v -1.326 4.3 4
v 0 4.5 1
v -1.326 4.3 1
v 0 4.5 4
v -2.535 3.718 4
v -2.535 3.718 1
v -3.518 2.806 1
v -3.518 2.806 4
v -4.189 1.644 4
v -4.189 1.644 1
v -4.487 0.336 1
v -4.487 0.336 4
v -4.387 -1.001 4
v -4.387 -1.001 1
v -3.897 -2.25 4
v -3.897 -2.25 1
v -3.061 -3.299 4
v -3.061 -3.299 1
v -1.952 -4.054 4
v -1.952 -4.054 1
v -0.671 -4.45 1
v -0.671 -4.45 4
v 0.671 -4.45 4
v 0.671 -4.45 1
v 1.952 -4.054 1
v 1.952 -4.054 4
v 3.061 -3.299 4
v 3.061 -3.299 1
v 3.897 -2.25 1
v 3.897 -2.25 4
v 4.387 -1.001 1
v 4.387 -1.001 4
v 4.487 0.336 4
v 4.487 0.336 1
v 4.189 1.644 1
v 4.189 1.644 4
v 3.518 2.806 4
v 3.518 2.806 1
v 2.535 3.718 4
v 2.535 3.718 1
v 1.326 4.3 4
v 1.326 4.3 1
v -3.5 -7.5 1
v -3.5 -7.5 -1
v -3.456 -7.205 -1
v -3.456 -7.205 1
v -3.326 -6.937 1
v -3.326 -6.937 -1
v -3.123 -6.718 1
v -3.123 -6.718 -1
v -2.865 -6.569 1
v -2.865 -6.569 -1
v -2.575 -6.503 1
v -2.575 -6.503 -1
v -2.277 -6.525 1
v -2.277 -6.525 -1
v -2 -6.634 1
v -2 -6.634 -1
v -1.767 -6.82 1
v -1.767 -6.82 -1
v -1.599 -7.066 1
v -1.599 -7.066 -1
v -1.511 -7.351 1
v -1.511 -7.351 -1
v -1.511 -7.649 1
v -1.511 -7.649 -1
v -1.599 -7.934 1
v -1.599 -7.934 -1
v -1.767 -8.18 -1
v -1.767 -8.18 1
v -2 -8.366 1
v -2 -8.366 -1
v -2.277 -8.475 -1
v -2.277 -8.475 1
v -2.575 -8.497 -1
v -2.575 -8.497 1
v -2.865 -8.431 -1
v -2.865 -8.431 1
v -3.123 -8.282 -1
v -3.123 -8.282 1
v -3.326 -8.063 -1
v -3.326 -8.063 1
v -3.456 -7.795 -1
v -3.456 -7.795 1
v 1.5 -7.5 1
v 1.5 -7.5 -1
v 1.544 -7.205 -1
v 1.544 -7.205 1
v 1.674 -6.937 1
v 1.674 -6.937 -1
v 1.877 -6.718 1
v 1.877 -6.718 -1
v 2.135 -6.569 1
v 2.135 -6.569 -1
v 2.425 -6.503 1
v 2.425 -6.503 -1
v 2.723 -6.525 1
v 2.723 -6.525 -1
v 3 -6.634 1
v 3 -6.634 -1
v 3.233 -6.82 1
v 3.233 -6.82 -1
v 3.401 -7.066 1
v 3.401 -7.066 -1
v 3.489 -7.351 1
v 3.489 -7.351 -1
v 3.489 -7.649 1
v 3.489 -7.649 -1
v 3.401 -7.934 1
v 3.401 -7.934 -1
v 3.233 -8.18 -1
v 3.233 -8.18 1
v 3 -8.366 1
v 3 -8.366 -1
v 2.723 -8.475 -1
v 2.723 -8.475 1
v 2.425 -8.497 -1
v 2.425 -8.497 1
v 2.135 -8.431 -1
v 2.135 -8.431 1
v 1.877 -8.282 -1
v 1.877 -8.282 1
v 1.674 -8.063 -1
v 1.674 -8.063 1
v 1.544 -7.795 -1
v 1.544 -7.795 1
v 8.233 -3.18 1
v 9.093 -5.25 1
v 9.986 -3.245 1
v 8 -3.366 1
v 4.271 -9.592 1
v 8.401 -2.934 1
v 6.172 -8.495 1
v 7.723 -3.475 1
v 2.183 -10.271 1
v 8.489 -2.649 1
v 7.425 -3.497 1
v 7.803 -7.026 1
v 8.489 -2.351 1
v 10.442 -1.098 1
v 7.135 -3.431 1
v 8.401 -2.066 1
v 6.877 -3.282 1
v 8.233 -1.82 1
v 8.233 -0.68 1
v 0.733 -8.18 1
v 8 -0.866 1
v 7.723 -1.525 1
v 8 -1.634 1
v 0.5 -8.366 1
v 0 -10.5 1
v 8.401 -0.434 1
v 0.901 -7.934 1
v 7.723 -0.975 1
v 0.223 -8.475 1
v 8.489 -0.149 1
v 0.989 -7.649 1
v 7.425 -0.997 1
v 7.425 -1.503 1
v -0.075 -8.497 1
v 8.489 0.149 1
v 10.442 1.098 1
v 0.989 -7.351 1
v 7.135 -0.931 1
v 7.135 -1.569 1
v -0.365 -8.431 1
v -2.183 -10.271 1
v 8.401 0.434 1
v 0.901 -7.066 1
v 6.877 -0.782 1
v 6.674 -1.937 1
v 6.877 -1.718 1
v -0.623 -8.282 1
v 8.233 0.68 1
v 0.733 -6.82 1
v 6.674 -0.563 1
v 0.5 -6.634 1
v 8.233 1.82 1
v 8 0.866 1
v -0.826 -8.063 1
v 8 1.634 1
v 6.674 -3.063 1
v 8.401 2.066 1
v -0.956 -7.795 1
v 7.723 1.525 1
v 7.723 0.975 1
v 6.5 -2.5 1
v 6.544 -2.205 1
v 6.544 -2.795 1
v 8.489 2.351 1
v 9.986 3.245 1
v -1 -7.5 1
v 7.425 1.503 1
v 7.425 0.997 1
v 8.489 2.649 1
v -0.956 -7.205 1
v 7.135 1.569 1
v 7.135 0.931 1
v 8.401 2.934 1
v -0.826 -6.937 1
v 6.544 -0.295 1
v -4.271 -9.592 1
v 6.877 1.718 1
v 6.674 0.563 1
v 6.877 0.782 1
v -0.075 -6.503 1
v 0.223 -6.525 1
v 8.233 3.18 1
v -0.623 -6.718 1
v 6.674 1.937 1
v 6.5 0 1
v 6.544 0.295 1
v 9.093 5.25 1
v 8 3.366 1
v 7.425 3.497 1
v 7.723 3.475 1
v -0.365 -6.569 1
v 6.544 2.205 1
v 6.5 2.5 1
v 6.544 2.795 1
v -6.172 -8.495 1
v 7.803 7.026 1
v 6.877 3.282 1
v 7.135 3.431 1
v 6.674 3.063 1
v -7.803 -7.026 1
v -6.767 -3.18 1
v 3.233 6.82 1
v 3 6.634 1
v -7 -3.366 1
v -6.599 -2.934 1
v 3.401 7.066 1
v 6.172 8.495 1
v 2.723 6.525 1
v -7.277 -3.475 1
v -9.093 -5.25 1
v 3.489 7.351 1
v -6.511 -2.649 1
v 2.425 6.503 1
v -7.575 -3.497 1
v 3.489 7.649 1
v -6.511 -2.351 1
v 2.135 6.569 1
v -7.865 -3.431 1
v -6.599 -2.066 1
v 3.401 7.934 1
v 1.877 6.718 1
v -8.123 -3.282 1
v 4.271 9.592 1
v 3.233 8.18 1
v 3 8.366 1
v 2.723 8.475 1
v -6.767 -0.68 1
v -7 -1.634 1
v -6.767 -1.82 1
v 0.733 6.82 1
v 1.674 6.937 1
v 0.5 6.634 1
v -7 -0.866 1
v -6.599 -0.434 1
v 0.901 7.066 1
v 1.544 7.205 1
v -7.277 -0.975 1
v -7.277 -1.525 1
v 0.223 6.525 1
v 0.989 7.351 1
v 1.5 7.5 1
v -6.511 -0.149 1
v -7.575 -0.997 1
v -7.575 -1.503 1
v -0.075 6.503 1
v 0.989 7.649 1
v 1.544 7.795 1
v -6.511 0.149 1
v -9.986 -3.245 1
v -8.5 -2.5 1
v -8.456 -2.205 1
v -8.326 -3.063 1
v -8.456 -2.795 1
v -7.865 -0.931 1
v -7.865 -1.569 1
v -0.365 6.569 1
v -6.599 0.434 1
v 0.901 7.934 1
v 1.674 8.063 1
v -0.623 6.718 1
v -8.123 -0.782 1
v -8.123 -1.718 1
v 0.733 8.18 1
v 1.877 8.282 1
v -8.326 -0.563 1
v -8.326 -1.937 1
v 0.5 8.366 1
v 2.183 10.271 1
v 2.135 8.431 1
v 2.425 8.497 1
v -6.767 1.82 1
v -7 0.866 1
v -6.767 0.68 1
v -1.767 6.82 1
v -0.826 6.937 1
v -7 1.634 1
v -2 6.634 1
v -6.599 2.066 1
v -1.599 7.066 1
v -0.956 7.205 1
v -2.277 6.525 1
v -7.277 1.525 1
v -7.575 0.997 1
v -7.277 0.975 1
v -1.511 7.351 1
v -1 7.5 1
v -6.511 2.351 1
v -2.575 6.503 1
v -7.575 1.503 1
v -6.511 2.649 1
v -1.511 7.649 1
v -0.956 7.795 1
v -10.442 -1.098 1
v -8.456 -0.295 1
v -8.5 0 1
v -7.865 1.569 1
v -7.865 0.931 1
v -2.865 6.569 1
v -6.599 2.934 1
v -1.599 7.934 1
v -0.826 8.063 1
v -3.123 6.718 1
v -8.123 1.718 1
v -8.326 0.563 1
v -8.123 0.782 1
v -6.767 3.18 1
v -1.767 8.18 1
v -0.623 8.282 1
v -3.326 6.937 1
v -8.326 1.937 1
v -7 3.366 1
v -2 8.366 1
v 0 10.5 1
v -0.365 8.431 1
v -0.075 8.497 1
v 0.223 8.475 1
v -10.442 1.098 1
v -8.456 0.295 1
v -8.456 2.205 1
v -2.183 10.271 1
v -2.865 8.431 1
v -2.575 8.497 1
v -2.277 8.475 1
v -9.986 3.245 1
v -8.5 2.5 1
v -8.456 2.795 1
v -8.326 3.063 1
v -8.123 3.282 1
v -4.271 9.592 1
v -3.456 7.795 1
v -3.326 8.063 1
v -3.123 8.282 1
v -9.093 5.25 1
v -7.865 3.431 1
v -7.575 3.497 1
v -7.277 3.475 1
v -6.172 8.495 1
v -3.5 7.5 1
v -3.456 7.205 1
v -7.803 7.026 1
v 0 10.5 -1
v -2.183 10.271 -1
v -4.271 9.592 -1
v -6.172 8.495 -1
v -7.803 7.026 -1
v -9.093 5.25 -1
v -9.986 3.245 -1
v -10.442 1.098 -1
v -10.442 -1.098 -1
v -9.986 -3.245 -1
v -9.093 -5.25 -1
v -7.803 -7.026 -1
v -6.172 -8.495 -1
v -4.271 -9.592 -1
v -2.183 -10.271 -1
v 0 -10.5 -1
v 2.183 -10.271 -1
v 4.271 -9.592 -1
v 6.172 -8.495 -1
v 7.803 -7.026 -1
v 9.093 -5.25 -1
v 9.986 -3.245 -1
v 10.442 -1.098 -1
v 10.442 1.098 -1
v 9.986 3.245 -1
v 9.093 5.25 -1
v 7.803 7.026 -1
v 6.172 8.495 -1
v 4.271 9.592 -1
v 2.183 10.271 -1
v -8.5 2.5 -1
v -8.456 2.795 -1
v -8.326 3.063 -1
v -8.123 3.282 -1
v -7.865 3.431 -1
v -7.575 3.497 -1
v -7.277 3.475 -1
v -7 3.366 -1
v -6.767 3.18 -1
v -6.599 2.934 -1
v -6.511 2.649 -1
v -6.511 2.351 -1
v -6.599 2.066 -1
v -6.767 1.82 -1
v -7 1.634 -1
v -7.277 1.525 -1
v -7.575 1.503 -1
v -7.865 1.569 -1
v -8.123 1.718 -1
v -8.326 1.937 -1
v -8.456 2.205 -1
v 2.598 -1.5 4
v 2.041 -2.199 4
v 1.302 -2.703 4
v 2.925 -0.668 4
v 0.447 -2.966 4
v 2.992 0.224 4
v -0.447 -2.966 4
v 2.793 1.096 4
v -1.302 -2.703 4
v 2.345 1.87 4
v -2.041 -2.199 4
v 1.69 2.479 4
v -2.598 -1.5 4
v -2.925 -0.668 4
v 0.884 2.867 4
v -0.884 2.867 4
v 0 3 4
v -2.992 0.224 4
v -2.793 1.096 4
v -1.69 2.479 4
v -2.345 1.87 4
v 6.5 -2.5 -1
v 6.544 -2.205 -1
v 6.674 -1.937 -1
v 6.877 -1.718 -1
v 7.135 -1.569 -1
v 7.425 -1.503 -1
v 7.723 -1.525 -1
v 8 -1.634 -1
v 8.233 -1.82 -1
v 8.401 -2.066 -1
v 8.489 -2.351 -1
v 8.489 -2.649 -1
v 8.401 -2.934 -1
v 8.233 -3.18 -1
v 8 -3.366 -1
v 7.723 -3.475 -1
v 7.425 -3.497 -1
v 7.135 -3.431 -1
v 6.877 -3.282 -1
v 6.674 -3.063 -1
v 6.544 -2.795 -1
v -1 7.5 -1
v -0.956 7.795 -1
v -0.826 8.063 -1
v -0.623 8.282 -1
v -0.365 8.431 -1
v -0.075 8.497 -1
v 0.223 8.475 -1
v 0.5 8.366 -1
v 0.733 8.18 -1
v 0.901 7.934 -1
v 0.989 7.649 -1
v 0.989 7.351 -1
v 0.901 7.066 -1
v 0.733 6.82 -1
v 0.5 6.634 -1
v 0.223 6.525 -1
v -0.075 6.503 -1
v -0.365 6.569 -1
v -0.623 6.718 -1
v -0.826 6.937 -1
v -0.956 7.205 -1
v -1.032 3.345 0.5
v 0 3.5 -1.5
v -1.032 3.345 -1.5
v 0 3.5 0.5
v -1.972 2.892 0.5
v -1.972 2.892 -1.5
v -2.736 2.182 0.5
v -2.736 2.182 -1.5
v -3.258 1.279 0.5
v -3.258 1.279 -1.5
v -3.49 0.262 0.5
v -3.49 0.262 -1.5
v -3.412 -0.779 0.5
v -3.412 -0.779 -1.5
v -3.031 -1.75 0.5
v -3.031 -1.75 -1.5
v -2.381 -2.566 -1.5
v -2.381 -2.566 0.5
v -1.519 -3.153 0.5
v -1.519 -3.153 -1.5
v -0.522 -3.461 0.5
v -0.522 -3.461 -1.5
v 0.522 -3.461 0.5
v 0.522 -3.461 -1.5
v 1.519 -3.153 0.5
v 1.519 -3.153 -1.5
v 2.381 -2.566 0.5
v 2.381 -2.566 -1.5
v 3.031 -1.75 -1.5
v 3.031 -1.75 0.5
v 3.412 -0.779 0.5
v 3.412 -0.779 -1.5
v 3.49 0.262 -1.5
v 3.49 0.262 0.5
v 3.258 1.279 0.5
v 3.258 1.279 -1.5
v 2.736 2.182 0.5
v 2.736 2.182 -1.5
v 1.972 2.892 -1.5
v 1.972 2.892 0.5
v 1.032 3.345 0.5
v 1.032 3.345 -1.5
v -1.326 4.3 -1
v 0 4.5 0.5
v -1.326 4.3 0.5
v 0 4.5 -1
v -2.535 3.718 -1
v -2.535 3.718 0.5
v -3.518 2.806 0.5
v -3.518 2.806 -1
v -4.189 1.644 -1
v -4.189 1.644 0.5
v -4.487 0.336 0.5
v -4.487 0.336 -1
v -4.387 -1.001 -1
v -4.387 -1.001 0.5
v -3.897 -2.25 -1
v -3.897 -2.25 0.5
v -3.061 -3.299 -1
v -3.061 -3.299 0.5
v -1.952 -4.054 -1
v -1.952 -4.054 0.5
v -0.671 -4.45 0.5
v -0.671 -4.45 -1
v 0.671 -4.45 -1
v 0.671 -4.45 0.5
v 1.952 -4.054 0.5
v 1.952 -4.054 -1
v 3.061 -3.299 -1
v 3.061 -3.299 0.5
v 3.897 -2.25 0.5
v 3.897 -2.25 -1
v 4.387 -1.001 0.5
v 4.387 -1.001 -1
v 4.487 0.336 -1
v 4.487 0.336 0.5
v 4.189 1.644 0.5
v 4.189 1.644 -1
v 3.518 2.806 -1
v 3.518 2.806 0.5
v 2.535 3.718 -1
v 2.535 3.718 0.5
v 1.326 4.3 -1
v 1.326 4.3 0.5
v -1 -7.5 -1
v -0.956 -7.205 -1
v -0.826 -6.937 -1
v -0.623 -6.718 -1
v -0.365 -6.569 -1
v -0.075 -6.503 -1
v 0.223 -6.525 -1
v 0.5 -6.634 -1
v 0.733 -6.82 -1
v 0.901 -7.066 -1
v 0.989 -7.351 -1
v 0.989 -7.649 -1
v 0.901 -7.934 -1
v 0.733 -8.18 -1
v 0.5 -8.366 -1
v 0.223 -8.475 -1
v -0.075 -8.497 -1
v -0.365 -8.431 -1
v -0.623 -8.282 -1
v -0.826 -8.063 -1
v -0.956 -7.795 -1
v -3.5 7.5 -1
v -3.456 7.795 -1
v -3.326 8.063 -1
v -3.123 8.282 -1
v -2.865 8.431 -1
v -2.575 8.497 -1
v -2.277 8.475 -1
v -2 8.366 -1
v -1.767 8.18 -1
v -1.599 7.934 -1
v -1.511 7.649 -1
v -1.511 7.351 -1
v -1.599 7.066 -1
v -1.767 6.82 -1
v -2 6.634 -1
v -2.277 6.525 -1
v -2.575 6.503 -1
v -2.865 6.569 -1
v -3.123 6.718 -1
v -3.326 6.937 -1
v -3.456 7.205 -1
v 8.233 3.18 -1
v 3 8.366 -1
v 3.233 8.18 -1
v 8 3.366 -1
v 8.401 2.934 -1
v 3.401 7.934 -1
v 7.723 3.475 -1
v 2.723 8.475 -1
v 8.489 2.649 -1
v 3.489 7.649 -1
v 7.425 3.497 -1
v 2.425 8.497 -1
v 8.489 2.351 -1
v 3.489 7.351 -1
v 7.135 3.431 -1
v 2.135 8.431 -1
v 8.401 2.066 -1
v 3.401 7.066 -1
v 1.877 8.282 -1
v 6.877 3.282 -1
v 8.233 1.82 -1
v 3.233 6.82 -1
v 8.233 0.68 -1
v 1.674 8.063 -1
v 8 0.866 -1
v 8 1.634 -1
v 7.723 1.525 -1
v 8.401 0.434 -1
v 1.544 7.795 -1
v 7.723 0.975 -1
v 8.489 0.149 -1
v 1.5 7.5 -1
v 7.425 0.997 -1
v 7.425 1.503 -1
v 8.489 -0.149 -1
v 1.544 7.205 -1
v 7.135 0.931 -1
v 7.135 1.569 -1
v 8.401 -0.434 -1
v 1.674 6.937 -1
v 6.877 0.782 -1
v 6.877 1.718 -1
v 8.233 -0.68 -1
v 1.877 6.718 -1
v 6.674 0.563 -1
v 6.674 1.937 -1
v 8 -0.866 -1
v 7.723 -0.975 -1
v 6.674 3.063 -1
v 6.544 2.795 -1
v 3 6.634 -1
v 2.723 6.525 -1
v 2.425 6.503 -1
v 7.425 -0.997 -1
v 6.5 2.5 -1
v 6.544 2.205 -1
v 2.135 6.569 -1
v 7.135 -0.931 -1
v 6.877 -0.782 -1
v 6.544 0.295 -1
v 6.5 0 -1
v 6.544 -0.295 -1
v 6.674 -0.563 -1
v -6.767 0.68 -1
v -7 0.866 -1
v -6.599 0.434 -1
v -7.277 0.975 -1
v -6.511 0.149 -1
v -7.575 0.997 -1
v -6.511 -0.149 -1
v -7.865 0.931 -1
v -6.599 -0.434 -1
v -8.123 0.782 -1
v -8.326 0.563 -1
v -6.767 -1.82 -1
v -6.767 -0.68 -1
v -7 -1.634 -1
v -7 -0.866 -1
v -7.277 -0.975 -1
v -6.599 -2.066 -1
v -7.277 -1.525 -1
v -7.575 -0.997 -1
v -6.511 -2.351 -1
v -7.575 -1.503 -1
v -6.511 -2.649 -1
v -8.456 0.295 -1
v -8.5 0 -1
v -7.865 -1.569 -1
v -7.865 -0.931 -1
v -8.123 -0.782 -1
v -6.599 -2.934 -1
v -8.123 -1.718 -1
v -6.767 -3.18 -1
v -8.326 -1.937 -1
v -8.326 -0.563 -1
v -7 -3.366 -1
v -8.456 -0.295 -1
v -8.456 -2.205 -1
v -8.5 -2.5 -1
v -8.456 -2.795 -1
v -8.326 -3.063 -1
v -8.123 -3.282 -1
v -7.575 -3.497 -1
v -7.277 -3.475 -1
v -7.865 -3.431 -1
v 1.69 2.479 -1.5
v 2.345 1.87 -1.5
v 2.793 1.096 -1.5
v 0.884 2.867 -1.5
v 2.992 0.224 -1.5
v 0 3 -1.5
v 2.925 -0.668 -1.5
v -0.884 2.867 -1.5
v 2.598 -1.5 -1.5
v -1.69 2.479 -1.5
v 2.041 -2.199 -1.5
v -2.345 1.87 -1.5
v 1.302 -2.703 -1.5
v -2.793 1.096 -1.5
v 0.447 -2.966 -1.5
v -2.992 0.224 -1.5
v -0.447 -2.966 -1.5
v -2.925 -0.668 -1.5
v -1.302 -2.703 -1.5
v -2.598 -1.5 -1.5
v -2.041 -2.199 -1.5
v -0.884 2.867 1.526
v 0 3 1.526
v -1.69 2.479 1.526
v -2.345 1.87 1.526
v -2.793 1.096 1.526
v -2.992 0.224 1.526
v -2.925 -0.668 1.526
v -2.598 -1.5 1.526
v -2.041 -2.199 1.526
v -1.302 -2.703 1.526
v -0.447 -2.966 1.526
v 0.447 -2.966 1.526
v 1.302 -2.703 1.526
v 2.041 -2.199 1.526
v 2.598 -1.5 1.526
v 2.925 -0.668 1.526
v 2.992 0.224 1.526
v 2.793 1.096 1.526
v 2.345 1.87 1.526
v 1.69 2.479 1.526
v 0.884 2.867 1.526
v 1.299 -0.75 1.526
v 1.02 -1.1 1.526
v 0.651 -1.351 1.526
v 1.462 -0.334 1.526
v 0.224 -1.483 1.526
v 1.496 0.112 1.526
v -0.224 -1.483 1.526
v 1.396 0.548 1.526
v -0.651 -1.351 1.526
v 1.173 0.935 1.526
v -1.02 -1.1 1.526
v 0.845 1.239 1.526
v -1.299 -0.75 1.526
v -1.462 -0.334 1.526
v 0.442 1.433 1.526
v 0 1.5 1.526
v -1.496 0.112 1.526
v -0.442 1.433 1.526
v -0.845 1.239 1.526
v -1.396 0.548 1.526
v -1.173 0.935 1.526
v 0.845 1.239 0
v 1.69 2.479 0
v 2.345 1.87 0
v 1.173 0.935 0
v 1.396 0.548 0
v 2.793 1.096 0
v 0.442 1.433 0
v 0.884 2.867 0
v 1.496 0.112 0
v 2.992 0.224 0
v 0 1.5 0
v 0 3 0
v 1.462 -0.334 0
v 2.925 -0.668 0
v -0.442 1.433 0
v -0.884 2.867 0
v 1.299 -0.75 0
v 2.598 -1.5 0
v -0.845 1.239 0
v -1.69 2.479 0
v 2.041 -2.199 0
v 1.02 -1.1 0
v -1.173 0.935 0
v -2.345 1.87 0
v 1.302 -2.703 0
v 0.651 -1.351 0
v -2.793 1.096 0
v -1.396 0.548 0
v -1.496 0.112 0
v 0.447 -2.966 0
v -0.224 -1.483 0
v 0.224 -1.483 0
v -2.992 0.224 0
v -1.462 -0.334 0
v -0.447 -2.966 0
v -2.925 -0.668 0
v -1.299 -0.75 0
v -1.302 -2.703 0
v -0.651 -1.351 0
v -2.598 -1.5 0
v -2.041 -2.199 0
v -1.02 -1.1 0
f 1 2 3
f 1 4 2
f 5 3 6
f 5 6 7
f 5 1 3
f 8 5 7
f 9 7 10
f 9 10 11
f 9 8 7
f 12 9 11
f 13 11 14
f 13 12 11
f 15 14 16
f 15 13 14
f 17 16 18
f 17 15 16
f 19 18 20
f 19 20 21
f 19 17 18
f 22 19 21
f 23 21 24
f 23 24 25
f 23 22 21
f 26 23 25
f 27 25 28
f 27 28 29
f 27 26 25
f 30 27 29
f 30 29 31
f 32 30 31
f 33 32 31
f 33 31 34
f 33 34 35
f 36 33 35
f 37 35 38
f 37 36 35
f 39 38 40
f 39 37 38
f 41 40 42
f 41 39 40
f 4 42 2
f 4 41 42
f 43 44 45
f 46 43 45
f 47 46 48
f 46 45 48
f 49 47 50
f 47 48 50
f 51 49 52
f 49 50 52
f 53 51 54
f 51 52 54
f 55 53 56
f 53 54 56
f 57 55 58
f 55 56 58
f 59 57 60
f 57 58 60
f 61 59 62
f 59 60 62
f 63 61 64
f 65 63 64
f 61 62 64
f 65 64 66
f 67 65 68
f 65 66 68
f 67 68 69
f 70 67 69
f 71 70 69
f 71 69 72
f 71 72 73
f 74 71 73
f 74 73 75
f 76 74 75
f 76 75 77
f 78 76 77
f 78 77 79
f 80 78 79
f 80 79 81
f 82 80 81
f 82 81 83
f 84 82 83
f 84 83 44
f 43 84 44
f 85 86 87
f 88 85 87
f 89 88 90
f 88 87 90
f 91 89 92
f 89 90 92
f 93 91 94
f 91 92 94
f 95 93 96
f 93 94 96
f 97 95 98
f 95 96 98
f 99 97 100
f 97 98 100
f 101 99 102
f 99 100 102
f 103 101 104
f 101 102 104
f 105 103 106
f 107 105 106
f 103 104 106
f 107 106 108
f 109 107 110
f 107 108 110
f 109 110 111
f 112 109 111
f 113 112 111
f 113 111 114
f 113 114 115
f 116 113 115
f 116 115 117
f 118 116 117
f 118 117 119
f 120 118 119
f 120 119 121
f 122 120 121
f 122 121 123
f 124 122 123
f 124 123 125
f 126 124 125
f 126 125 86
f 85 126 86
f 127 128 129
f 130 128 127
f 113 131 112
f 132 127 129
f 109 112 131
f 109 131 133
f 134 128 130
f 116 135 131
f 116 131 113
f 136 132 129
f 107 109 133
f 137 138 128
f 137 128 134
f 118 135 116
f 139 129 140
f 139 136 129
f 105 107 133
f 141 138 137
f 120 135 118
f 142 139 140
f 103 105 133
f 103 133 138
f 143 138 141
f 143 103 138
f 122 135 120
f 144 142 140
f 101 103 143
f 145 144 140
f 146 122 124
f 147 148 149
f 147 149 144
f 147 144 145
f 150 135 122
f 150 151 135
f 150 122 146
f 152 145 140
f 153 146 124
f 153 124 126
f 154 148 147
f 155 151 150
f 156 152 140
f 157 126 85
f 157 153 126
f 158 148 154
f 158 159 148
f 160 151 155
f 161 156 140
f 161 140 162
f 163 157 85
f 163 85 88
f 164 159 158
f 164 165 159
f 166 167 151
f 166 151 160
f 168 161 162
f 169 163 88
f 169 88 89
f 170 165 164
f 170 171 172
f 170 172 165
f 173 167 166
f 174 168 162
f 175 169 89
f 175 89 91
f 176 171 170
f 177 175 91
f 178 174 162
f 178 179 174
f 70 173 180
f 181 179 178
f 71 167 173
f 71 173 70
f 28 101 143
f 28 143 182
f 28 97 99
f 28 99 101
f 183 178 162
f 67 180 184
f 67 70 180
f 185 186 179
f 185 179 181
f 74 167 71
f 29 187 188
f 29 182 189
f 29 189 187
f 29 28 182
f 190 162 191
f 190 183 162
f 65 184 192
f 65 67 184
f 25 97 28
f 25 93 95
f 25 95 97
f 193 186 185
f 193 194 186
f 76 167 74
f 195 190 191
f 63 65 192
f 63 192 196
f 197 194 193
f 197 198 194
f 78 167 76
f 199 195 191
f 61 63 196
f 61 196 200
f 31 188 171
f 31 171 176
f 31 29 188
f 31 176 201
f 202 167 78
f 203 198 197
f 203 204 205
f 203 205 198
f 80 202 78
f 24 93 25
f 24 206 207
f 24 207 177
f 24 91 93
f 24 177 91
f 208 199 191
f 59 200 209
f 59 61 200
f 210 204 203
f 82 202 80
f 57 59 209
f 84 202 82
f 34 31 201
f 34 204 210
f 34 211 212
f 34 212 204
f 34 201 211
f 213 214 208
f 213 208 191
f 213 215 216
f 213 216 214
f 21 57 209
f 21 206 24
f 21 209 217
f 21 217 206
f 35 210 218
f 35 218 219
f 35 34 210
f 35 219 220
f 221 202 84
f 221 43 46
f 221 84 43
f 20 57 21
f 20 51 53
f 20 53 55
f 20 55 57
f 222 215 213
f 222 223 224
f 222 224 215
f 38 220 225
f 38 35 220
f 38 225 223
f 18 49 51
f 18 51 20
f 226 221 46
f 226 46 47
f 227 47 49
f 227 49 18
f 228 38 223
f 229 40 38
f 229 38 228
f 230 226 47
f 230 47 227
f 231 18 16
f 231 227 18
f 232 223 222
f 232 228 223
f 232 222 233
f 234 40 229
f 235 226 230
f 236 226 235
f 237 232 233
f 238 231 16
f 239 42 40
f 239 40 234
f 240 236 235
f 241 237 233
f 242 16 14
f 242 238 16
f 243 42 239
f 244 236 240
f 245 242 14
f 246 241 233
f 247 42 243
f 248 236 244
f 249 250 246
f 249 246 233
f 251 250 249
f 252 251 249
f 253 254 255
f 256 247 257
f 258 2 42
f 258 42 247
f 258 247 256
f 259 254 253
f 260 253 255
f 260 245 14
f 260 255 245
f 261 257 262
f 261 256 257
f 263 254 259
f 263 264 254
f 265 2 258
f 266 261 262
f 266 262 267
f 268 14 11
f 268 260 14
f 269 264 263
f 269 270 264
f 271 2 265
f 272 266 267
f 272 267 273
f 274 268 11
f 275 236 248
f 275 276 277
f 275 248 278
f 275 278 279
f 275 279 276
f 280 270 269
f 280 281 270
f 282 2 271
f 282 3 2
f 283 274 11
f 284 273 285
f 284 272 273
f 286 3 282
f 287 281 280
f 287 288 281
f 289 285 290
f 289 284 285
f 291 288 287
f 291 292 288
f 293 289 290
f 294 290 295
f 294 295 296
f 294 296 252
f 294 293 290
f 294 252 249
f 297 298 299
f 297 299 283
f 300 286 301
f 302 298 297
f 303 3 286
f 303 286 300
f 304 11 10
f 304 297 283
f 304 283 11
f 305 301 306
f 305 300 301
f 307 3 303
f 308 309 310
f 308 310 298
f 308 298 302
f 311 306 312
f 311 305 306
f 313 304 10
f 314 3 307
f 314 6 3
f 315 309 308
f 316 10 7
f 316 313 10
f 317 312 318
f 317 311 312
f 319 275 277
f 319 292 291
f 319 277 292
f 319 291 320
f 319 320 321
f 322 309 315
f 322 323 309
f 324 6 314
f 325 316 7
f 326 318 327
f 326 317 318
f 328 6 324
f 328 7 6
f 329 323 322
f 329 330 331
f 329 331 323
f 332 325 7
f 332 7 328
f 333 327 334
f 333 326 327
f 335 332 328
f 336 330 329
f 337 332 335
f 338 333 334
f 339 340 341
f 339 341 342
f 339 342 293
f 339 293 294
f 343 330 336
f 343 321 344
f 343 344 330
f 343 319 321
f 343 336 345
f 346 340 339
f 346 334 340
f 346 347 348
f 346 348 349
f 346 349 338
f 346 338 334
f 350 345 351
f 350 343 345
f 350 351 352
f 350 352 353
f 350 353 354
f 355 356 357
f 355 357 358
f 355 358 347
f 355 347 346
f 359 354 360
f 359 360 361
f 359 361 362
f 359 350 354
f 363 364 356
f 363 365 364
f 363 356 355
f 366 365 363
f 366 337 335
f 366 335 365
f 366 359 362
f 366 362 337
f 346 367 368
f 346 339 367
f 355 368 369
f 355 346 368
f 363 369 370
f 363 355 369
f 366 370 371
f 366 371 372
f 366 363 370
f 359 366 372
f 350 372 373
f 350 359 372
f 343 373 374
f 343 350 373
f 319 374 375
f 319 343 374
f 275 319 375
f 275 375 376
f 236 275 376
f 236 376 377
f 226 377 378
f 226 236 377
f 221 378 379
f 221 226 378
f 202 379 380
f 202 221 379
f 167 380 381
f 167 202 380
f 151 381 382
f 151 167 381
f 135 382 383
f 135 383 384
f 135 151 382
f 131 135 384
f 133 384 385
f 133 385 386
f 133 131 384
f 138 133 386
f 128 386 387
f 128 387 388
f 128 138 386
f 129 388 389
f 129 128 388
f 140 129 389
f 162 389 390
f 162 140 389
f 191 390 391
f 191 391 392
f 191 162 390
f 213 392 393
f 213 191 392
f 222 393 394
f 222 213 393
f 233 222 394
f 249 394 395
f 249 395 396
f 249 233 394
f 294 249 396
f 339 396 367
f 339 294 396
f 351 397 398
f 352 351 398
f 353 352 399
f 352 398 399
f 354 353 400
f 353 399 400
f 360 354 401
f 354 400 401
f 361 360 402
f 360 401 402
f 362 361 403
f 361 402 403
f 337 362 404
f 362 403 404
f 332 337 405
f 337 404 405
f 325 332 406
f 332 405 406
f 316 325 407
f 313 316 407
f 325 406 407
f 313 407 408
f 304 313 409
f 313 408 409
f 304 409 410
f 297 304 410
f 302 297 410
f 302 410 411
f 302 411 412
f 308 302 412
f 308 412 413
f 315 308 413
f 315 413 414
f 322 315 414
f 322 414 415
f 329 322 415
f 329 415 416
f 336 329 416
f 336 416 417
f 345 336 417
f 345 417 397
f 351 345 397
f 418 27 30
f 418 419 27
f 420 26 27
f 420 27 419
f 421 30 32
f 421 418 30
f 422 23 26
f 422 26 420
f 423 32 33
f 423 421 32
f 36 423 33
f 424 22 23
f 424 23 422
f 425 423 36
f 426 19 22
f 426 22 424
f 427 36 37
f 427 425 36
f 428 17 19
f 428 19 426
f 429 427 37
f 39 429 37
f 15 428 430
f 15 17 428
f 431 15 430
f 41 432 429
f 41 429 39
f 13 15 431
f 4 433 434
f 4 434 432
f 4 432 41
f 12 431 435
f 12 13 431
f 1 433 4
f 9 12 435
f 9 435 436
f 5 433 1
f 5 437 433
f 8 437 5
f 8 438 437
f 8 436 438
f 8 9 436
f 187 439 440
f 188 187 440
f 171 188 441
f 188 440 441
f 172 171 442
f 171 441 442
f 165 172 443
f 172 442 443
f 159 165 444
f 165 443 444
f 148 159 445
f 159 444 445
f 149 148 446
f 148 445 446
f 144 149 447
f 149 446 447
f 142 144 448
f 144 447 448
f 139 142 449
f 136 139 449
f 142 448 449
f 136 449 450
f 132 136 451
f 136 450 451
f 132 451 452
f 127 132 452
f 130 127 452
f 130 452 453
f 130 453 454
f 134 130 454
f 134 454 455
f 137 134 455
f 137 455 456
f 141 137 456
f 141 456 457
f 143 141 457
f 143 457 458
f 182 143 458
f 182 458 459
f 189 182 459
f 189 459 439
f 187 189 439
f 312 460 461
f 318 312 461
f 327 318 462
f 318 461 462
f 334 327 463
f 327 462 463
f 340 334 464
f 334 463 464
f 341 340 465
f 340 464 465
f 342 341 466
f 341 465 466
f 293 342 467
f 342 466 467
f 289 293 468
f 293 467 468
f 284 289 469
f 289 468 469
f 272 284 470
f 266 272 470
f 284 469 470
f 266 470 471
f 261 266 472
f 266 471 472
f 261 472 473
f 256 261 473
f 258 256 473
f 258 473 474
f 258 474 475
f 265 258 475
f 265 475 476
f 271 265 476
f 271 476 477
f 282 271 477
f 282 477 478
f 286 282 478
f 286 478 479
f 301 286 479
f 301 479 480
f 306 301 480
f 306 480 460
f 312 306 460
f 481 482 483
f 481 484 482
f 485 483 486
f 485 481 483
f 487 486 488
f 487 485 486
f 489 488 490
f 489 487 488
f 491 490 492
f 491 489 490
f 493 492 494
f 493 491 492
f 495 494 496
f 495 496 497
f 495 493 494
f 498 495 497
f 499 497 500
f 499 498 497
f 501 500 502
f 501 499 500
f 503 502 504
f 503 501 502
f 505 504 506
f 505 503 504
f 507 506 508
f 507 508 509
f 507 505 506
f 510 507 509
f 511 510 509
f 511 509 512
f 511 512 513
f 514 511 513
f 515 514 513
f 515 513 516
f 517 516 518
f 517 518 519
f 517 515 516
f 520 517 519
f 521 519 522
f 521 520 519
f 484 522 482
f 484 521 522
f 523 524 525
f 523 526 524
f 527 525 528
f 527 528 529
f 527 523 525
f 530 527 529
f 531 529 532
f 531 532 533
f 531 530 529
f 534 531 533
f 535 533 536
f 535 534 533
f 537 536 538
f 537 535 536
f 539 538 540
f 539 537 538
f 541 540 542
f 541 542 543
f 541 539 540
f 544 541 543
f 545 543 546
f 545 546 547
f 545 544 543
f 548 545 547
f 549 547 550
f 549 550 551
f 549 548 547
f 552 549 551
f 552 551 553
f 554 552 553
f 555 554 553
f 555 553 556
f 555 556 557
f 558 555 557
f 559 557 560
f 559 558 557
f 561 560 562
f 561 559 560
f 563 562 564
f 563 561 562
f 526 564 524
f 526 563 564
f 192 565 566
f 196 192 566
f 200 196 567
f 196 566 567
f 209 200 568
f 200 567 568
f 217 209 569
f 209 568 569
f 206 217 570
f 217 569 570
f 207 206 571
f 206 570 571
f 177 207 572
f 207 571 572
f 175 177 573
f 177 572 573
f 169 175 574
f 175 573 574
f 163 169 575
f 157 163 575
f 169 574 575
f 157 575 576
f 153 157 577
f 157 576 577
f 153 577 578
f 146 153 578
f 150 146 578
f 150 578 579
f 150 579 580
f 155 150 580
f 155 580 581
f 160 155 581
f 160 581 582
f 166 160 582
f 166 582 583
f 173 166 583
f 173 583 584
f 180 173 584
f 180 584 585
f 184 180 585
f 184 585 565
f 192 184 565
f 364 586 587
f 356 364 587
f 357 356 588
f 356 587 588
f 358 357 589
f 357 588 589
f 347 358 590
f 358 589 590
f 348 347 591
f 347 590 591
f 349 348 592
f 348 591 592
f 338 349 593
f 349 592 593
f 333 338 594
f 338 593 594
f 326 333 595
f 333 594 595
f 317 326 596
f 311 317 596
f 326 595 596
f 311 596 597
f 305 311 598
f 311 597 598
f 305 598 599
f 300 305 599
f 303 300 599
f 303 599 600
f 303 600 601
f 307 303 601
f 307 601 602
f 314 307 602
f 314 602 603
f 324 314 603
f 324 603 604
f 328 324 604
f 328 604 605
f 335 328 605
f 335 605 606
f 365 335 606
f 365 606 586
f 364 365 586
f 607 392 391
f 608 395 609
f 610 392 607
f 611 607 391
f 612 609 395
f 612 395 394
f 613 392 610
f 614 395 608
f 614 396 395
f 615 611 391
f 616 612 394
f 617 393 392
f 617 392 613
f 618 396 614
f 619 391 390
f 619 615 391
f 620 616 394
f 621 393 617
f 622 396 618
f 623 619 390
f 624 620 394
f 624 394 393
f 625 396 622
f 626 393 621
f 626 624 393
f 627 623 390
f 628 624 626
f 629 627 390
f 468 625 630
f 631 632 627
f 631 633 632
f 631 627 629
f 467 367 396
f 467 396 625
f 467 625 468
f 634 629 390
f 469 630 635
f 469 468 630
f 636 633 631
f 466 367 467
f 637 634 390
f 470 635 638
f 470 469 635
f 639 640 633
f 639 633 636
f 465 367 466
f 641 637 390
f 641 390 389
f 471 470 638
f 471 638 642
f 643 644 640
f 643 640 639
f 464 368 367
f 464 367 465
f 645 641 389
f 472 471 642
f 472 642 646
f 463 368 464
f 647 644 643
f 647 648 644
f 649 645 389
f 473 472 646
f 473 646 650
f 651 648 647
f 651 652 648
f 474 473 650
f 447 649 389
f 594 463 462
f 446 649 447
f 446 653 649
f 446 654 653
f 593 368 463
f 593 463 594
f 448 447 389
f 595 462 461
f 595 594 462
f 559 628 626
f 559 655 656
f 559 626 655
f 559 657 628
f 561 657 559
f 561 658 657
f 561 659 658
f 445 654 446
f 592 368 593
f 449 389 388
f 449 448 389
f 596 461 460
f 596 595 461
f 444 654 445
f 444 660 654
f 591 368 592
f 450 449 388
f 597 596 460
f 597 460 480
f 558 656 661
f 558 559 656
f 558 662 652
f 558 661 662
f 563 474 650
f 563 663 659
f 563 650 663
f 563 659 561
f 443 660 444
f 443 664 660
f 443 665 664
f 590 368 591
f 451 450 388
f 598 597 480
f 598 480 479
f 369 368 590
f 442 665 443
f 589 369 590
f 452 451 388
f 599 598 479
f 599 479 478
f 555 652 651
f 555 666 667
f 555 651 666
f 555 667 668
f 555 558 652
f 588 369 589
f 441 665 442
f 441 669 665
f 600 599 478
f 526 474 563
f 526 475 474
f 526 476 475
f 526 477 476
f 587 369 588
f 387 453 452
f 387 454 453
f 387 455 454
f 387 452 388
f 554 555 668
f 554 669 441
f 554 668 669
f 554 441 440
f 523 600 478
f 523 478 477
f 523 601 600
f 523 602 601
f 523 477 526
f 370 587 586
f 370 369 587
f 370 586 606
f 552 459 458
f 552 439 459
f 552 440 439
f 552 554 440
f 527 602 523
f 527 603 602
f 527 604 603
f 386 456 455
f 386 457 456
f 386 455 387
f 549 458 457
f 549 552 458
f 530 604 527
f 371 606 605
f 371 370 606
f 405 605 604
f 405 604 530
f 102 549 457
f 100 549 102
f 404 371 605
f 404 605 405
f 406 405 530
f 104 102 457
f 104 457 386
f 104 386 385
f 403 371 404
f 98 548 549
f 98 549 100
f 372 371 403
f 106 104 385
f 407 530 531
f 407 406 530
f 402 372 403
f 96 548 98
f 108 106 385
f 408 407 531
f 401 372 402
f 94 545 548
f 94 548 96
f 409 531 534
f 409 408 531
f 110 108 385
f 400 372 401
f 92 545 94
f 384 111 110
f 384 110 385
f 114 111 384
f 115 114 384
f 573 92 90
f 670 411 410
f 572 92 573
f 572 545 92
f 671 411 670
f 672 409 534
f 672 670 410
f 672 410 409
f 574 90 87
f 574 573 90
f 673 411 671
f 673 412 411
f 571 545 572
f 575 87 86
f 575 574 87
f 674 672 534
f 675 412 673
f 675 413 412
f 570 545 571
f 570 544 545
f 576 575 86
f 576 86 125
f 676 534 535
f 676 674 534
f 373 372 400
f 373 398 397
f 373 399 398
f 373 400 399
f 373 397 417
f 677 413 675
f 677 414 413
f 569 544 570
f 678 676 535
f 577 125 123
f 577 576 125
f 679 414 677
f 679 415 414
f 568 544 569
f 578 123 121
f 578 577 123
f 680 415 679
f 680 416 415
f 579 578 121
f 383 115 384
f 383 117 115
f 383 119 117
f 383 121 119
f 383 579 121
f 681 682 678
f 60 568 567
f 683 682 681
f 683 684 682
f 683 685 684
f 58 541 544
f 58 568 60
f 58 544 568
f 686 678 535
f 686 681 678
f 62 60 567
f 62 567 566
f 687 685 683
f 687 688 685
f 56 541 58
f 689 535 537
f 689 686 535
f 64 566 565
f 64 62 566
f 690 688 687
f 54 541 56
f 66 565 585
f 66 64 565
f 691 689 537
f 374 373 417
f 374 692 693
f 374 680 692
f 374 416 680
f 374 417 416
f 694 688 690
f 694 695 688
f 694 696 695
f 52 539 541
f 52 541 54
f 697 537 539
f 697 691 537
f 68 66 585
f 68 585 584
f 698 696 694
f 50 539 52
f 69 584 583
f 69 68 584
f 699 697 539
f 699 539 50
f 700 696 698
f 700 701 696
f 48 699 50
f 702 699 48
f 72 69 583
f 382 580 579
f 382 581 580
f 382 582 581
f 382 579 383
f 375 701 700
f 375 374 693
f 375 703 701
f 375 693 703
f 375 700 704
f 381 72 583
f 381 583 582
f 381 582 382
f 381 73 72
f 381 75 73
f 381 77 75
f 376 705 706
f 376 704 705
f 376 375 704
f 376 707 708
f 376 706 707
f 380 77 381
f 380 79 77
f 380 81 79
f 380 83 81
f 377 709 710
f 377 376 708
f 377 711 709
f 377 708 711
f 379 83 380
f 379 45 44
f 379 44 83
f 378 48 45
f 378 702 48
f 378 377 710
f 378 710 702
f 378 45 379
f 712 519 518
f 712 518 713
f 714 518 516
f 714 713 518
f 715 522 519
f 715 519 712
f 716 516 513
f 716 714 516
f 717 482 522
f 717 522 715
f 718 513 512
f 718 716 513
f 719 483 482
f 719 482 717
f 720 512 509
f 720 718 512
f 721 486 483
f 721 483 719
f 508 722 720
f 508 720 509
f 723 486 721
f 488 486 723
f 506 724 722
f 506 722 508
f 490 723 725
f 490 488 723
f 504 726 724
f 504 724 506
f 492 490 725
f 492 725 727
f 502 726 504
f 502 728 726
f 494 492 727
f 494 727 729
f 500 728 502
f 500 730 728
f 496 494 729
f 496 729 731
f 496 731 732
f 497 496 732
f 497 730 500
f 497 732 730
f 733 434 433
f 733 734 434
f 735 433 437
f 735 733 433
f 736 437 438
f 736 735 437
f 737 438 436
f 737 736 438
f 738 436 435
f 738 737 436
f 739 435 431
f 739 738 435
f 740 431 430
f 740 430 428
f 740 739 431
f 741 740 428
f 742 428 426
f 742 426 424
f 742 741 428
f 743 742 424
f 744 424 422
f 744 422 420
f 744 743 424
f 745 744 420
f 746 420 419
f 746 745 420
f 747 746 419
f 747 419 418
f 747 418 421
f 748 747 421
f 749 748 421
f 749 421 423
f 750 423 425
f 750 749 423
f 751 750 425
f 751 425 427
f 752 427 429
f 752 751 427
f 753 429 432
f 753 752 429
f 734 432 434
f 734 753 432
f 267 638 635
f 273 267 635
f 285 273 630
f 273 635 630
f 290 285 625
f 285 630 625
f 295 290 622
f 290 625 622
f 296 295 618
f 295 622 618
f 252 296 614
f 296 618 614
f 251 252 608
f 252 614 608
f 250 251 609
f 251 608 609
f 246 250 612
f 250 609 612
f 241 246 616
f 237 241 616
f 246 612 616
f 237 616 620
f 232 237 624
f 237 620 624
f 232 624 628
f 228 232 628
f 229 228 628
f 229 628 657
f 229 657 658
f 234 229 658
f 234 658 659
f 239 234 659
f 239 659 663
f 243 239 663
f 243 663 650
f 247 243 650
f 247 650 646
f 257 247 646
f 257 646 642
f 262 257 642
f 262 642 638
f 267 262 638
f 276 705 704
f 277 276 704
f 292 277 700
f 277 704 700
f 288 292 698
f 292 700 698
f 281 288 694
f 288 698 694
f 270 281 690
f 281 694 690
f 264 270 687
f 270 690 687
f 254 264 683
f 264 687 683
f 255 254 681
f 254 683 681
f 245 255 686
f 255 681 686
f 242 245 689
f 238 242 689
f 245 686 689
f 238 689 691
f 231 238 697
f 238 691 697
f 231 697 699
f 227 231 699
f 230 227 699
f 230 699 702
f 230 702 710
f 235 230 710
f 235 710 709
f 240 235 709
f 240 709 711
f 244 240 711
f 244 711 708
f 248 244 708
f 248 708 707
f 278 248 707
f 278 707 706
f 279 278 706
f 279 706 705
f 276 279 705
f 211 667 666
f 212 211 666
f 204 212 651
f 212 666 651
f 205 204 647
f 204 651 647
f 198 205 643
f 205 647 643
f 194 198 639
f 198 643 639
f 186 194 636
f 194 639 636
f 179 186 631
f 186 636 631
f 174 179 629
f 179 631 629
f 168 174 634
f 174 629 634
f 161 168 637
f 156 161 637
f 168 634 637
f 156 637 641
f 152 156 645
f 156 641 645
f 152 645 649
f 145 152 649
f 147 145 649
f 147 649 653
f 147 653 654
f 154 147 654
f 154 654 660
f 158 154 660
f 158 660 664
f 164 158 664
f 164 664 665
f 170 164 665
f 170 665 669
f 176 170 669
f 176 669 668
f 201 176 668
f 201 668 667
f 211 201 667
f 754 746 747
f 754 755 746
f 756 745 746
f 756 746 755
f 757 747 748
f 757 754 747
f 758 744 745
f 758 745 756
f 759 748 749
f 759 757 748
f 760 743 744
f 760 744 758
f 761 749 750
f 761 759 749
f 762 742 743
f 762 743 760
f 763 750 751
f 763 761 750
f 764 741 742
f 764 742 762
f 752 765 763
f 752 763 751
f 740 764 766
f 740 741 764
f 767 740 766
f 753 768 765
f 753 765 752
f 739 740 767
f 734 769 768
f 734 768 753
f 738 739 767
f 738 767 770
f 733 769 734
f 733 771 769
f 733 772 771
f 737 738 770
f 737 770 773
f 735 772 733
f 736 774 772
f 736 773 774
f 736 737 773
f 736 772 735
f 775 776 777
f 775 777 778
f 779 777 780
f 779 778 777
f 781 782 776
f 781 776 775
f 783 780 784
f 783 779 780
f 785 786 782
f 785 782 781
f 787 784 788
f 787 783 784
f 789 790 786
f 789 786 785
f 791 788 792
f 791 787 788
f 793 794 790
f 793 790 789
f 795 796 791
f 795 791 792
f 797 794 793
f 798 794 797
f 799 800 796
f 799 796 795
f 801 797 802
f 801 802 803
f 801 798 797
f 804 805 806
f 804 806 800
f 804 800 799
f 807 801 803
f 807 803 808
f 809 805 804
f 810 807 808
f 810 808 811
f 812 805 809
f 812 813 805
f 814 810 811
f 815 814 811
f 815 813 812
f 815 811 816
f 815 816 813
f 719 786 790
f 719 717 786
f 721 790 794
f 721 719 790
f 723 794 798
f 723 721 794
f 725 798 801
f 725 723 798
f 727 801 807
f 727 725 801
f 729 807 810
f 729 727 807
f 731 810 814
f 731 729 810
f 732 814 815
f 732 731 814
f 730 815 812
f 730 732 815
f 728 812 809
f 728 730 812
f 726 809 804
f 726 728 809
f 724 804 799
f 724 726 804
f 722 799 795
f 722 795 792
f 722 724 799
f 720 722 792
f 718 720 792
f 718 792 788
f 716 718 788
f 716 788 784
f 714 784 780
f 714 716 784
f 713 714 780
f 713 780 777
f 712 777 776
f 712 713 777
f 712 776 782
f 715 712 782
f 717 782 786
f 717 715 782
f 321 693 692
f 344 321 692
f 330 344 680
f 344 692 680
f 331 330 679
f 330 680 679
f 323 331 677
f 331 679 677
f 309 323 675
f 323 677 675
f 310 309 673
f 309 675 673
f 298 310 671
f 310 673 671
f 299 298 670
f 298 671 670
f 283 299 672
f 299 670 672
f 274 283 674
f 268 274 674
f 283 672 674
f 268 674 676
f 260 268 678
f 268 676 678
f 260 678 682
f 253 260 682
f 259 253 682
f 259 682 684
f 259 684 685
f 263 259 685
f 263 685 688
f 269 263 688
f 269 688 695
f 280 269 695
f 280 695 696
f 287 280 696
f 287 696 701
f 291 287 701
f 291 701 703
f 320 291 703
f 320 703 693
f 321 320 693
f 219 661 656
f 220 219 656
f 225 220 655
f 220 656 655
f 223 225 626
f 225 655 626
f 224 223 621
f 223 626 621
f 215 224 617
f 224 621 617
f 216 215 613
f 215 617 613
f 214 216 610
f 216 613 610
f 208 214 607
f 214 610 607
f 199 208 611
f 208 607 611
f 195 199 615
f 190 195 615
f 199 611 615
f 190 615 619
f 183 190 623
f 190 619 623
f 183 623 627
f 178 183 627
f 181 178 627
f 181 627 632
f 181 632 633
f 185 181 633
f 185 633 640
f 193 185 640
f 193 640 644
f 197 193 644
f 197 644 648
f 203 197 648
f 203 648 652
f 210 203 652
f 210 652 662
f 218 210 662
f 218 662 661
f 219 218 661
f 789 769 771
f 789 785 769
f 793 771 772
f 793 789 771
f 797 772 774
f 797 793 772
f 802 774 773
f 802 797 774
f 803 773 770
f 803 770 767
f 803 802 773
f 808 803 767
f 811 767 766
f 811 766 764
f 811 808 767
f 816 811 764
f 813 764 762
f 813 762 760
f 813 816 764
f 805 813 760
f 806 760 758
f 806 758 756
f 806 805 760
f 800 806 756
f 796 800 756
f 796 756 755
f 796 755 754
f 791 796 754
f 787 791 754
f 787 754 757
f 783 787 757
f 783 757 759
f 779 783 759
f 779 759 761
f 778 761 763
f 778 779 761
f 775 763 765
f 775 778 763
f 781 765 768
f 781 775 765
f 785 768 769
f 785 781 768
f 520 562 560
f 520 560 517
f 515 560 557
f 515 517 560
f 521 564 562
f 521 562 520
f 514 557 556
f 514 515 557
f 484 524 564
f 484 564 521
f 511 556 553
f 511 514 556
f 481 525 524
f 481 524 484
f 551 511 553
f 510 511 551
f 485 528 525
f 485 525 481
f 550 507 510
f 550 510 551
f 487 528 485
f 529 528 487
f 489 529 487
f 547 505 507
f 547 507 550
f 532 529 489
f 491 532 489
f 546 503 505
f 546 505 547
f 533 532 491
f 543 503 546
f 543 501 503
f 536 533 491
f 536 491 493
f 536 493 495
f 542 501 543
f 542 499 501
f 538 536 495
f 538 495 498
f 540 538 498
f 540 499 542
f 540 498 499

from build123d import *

# Parameters (mm, degrees)
CROQUIS3_R            = 1
CORTAR_EXTRUIR1_DEPTH = 3


with BuildPart() as part:
    # Croquis2 → Revolución1 (revolve)
    with BuildSketch(Plane(origin=(0, 0, 0), x_dir=(0, 0, -1), z_dir=(1, 0, 0))):
        Polygon((0, 1.5), (0, 3), (1.5, 3), (1.5, 3.5), (-0.5, 3.5), (-0.5, 4.5), (1, 4.5), (1, 10.5), (-1, 10.5), (-1, 4.5), (-4, 4.5), (-4, 3), (-1.525538697, 3), (-1.525538697, 1.5), align=None)
    revolve(axis=Axis((0, 0, 0), (0, 0, 1)))

    # Croquis3 → Cortar-Extruir1 (cut)
    with BuildSketch(Plane(origin=(0, 0, -1), x_dir=(-1, 0, 0), z_dir=(0, 0, -1))):
        with Locations((7.5, 2.5)):
            Circle(CROQUIS3_R)
        with Locations((0, 7.5)):
            Circle(CROQUIS3_R)
        with Locations((7.5, 0)):
            Circle(CROQUIS3_R)
        with Locations((-7.5, 0)):
            Circle(CROQUIS3_R)
        with Locations((0, -7.5)):
            Circle(CROQUIS3_R)
        with Locations((2.5, -7.5)):
            Circle(CROQUIS3_R)
        with Locations((-7.5, -2.5)):
            Circle(CROQUIS3_R)
        with Locations((-2.5, 7.5)):
            Circle(CROQUIS3_R)
        with Locations((7.5, -2.5)):
            Circle(CROQUIS3_R)
        with Locations((-2.5, -7.5)):
            Circle(CROQUIS3_R)
        with Locations((-7.5, 2.5)):
            Circle(CROQUIS3_R)
        with Locations((2.5, 7.5)):
            Circle(CROQUIS3_R)
    extrude(amount=-CORTAR_EXTRUIR1_DEPTH, mode=Mode.SUBTRACT)


solid = part.part
